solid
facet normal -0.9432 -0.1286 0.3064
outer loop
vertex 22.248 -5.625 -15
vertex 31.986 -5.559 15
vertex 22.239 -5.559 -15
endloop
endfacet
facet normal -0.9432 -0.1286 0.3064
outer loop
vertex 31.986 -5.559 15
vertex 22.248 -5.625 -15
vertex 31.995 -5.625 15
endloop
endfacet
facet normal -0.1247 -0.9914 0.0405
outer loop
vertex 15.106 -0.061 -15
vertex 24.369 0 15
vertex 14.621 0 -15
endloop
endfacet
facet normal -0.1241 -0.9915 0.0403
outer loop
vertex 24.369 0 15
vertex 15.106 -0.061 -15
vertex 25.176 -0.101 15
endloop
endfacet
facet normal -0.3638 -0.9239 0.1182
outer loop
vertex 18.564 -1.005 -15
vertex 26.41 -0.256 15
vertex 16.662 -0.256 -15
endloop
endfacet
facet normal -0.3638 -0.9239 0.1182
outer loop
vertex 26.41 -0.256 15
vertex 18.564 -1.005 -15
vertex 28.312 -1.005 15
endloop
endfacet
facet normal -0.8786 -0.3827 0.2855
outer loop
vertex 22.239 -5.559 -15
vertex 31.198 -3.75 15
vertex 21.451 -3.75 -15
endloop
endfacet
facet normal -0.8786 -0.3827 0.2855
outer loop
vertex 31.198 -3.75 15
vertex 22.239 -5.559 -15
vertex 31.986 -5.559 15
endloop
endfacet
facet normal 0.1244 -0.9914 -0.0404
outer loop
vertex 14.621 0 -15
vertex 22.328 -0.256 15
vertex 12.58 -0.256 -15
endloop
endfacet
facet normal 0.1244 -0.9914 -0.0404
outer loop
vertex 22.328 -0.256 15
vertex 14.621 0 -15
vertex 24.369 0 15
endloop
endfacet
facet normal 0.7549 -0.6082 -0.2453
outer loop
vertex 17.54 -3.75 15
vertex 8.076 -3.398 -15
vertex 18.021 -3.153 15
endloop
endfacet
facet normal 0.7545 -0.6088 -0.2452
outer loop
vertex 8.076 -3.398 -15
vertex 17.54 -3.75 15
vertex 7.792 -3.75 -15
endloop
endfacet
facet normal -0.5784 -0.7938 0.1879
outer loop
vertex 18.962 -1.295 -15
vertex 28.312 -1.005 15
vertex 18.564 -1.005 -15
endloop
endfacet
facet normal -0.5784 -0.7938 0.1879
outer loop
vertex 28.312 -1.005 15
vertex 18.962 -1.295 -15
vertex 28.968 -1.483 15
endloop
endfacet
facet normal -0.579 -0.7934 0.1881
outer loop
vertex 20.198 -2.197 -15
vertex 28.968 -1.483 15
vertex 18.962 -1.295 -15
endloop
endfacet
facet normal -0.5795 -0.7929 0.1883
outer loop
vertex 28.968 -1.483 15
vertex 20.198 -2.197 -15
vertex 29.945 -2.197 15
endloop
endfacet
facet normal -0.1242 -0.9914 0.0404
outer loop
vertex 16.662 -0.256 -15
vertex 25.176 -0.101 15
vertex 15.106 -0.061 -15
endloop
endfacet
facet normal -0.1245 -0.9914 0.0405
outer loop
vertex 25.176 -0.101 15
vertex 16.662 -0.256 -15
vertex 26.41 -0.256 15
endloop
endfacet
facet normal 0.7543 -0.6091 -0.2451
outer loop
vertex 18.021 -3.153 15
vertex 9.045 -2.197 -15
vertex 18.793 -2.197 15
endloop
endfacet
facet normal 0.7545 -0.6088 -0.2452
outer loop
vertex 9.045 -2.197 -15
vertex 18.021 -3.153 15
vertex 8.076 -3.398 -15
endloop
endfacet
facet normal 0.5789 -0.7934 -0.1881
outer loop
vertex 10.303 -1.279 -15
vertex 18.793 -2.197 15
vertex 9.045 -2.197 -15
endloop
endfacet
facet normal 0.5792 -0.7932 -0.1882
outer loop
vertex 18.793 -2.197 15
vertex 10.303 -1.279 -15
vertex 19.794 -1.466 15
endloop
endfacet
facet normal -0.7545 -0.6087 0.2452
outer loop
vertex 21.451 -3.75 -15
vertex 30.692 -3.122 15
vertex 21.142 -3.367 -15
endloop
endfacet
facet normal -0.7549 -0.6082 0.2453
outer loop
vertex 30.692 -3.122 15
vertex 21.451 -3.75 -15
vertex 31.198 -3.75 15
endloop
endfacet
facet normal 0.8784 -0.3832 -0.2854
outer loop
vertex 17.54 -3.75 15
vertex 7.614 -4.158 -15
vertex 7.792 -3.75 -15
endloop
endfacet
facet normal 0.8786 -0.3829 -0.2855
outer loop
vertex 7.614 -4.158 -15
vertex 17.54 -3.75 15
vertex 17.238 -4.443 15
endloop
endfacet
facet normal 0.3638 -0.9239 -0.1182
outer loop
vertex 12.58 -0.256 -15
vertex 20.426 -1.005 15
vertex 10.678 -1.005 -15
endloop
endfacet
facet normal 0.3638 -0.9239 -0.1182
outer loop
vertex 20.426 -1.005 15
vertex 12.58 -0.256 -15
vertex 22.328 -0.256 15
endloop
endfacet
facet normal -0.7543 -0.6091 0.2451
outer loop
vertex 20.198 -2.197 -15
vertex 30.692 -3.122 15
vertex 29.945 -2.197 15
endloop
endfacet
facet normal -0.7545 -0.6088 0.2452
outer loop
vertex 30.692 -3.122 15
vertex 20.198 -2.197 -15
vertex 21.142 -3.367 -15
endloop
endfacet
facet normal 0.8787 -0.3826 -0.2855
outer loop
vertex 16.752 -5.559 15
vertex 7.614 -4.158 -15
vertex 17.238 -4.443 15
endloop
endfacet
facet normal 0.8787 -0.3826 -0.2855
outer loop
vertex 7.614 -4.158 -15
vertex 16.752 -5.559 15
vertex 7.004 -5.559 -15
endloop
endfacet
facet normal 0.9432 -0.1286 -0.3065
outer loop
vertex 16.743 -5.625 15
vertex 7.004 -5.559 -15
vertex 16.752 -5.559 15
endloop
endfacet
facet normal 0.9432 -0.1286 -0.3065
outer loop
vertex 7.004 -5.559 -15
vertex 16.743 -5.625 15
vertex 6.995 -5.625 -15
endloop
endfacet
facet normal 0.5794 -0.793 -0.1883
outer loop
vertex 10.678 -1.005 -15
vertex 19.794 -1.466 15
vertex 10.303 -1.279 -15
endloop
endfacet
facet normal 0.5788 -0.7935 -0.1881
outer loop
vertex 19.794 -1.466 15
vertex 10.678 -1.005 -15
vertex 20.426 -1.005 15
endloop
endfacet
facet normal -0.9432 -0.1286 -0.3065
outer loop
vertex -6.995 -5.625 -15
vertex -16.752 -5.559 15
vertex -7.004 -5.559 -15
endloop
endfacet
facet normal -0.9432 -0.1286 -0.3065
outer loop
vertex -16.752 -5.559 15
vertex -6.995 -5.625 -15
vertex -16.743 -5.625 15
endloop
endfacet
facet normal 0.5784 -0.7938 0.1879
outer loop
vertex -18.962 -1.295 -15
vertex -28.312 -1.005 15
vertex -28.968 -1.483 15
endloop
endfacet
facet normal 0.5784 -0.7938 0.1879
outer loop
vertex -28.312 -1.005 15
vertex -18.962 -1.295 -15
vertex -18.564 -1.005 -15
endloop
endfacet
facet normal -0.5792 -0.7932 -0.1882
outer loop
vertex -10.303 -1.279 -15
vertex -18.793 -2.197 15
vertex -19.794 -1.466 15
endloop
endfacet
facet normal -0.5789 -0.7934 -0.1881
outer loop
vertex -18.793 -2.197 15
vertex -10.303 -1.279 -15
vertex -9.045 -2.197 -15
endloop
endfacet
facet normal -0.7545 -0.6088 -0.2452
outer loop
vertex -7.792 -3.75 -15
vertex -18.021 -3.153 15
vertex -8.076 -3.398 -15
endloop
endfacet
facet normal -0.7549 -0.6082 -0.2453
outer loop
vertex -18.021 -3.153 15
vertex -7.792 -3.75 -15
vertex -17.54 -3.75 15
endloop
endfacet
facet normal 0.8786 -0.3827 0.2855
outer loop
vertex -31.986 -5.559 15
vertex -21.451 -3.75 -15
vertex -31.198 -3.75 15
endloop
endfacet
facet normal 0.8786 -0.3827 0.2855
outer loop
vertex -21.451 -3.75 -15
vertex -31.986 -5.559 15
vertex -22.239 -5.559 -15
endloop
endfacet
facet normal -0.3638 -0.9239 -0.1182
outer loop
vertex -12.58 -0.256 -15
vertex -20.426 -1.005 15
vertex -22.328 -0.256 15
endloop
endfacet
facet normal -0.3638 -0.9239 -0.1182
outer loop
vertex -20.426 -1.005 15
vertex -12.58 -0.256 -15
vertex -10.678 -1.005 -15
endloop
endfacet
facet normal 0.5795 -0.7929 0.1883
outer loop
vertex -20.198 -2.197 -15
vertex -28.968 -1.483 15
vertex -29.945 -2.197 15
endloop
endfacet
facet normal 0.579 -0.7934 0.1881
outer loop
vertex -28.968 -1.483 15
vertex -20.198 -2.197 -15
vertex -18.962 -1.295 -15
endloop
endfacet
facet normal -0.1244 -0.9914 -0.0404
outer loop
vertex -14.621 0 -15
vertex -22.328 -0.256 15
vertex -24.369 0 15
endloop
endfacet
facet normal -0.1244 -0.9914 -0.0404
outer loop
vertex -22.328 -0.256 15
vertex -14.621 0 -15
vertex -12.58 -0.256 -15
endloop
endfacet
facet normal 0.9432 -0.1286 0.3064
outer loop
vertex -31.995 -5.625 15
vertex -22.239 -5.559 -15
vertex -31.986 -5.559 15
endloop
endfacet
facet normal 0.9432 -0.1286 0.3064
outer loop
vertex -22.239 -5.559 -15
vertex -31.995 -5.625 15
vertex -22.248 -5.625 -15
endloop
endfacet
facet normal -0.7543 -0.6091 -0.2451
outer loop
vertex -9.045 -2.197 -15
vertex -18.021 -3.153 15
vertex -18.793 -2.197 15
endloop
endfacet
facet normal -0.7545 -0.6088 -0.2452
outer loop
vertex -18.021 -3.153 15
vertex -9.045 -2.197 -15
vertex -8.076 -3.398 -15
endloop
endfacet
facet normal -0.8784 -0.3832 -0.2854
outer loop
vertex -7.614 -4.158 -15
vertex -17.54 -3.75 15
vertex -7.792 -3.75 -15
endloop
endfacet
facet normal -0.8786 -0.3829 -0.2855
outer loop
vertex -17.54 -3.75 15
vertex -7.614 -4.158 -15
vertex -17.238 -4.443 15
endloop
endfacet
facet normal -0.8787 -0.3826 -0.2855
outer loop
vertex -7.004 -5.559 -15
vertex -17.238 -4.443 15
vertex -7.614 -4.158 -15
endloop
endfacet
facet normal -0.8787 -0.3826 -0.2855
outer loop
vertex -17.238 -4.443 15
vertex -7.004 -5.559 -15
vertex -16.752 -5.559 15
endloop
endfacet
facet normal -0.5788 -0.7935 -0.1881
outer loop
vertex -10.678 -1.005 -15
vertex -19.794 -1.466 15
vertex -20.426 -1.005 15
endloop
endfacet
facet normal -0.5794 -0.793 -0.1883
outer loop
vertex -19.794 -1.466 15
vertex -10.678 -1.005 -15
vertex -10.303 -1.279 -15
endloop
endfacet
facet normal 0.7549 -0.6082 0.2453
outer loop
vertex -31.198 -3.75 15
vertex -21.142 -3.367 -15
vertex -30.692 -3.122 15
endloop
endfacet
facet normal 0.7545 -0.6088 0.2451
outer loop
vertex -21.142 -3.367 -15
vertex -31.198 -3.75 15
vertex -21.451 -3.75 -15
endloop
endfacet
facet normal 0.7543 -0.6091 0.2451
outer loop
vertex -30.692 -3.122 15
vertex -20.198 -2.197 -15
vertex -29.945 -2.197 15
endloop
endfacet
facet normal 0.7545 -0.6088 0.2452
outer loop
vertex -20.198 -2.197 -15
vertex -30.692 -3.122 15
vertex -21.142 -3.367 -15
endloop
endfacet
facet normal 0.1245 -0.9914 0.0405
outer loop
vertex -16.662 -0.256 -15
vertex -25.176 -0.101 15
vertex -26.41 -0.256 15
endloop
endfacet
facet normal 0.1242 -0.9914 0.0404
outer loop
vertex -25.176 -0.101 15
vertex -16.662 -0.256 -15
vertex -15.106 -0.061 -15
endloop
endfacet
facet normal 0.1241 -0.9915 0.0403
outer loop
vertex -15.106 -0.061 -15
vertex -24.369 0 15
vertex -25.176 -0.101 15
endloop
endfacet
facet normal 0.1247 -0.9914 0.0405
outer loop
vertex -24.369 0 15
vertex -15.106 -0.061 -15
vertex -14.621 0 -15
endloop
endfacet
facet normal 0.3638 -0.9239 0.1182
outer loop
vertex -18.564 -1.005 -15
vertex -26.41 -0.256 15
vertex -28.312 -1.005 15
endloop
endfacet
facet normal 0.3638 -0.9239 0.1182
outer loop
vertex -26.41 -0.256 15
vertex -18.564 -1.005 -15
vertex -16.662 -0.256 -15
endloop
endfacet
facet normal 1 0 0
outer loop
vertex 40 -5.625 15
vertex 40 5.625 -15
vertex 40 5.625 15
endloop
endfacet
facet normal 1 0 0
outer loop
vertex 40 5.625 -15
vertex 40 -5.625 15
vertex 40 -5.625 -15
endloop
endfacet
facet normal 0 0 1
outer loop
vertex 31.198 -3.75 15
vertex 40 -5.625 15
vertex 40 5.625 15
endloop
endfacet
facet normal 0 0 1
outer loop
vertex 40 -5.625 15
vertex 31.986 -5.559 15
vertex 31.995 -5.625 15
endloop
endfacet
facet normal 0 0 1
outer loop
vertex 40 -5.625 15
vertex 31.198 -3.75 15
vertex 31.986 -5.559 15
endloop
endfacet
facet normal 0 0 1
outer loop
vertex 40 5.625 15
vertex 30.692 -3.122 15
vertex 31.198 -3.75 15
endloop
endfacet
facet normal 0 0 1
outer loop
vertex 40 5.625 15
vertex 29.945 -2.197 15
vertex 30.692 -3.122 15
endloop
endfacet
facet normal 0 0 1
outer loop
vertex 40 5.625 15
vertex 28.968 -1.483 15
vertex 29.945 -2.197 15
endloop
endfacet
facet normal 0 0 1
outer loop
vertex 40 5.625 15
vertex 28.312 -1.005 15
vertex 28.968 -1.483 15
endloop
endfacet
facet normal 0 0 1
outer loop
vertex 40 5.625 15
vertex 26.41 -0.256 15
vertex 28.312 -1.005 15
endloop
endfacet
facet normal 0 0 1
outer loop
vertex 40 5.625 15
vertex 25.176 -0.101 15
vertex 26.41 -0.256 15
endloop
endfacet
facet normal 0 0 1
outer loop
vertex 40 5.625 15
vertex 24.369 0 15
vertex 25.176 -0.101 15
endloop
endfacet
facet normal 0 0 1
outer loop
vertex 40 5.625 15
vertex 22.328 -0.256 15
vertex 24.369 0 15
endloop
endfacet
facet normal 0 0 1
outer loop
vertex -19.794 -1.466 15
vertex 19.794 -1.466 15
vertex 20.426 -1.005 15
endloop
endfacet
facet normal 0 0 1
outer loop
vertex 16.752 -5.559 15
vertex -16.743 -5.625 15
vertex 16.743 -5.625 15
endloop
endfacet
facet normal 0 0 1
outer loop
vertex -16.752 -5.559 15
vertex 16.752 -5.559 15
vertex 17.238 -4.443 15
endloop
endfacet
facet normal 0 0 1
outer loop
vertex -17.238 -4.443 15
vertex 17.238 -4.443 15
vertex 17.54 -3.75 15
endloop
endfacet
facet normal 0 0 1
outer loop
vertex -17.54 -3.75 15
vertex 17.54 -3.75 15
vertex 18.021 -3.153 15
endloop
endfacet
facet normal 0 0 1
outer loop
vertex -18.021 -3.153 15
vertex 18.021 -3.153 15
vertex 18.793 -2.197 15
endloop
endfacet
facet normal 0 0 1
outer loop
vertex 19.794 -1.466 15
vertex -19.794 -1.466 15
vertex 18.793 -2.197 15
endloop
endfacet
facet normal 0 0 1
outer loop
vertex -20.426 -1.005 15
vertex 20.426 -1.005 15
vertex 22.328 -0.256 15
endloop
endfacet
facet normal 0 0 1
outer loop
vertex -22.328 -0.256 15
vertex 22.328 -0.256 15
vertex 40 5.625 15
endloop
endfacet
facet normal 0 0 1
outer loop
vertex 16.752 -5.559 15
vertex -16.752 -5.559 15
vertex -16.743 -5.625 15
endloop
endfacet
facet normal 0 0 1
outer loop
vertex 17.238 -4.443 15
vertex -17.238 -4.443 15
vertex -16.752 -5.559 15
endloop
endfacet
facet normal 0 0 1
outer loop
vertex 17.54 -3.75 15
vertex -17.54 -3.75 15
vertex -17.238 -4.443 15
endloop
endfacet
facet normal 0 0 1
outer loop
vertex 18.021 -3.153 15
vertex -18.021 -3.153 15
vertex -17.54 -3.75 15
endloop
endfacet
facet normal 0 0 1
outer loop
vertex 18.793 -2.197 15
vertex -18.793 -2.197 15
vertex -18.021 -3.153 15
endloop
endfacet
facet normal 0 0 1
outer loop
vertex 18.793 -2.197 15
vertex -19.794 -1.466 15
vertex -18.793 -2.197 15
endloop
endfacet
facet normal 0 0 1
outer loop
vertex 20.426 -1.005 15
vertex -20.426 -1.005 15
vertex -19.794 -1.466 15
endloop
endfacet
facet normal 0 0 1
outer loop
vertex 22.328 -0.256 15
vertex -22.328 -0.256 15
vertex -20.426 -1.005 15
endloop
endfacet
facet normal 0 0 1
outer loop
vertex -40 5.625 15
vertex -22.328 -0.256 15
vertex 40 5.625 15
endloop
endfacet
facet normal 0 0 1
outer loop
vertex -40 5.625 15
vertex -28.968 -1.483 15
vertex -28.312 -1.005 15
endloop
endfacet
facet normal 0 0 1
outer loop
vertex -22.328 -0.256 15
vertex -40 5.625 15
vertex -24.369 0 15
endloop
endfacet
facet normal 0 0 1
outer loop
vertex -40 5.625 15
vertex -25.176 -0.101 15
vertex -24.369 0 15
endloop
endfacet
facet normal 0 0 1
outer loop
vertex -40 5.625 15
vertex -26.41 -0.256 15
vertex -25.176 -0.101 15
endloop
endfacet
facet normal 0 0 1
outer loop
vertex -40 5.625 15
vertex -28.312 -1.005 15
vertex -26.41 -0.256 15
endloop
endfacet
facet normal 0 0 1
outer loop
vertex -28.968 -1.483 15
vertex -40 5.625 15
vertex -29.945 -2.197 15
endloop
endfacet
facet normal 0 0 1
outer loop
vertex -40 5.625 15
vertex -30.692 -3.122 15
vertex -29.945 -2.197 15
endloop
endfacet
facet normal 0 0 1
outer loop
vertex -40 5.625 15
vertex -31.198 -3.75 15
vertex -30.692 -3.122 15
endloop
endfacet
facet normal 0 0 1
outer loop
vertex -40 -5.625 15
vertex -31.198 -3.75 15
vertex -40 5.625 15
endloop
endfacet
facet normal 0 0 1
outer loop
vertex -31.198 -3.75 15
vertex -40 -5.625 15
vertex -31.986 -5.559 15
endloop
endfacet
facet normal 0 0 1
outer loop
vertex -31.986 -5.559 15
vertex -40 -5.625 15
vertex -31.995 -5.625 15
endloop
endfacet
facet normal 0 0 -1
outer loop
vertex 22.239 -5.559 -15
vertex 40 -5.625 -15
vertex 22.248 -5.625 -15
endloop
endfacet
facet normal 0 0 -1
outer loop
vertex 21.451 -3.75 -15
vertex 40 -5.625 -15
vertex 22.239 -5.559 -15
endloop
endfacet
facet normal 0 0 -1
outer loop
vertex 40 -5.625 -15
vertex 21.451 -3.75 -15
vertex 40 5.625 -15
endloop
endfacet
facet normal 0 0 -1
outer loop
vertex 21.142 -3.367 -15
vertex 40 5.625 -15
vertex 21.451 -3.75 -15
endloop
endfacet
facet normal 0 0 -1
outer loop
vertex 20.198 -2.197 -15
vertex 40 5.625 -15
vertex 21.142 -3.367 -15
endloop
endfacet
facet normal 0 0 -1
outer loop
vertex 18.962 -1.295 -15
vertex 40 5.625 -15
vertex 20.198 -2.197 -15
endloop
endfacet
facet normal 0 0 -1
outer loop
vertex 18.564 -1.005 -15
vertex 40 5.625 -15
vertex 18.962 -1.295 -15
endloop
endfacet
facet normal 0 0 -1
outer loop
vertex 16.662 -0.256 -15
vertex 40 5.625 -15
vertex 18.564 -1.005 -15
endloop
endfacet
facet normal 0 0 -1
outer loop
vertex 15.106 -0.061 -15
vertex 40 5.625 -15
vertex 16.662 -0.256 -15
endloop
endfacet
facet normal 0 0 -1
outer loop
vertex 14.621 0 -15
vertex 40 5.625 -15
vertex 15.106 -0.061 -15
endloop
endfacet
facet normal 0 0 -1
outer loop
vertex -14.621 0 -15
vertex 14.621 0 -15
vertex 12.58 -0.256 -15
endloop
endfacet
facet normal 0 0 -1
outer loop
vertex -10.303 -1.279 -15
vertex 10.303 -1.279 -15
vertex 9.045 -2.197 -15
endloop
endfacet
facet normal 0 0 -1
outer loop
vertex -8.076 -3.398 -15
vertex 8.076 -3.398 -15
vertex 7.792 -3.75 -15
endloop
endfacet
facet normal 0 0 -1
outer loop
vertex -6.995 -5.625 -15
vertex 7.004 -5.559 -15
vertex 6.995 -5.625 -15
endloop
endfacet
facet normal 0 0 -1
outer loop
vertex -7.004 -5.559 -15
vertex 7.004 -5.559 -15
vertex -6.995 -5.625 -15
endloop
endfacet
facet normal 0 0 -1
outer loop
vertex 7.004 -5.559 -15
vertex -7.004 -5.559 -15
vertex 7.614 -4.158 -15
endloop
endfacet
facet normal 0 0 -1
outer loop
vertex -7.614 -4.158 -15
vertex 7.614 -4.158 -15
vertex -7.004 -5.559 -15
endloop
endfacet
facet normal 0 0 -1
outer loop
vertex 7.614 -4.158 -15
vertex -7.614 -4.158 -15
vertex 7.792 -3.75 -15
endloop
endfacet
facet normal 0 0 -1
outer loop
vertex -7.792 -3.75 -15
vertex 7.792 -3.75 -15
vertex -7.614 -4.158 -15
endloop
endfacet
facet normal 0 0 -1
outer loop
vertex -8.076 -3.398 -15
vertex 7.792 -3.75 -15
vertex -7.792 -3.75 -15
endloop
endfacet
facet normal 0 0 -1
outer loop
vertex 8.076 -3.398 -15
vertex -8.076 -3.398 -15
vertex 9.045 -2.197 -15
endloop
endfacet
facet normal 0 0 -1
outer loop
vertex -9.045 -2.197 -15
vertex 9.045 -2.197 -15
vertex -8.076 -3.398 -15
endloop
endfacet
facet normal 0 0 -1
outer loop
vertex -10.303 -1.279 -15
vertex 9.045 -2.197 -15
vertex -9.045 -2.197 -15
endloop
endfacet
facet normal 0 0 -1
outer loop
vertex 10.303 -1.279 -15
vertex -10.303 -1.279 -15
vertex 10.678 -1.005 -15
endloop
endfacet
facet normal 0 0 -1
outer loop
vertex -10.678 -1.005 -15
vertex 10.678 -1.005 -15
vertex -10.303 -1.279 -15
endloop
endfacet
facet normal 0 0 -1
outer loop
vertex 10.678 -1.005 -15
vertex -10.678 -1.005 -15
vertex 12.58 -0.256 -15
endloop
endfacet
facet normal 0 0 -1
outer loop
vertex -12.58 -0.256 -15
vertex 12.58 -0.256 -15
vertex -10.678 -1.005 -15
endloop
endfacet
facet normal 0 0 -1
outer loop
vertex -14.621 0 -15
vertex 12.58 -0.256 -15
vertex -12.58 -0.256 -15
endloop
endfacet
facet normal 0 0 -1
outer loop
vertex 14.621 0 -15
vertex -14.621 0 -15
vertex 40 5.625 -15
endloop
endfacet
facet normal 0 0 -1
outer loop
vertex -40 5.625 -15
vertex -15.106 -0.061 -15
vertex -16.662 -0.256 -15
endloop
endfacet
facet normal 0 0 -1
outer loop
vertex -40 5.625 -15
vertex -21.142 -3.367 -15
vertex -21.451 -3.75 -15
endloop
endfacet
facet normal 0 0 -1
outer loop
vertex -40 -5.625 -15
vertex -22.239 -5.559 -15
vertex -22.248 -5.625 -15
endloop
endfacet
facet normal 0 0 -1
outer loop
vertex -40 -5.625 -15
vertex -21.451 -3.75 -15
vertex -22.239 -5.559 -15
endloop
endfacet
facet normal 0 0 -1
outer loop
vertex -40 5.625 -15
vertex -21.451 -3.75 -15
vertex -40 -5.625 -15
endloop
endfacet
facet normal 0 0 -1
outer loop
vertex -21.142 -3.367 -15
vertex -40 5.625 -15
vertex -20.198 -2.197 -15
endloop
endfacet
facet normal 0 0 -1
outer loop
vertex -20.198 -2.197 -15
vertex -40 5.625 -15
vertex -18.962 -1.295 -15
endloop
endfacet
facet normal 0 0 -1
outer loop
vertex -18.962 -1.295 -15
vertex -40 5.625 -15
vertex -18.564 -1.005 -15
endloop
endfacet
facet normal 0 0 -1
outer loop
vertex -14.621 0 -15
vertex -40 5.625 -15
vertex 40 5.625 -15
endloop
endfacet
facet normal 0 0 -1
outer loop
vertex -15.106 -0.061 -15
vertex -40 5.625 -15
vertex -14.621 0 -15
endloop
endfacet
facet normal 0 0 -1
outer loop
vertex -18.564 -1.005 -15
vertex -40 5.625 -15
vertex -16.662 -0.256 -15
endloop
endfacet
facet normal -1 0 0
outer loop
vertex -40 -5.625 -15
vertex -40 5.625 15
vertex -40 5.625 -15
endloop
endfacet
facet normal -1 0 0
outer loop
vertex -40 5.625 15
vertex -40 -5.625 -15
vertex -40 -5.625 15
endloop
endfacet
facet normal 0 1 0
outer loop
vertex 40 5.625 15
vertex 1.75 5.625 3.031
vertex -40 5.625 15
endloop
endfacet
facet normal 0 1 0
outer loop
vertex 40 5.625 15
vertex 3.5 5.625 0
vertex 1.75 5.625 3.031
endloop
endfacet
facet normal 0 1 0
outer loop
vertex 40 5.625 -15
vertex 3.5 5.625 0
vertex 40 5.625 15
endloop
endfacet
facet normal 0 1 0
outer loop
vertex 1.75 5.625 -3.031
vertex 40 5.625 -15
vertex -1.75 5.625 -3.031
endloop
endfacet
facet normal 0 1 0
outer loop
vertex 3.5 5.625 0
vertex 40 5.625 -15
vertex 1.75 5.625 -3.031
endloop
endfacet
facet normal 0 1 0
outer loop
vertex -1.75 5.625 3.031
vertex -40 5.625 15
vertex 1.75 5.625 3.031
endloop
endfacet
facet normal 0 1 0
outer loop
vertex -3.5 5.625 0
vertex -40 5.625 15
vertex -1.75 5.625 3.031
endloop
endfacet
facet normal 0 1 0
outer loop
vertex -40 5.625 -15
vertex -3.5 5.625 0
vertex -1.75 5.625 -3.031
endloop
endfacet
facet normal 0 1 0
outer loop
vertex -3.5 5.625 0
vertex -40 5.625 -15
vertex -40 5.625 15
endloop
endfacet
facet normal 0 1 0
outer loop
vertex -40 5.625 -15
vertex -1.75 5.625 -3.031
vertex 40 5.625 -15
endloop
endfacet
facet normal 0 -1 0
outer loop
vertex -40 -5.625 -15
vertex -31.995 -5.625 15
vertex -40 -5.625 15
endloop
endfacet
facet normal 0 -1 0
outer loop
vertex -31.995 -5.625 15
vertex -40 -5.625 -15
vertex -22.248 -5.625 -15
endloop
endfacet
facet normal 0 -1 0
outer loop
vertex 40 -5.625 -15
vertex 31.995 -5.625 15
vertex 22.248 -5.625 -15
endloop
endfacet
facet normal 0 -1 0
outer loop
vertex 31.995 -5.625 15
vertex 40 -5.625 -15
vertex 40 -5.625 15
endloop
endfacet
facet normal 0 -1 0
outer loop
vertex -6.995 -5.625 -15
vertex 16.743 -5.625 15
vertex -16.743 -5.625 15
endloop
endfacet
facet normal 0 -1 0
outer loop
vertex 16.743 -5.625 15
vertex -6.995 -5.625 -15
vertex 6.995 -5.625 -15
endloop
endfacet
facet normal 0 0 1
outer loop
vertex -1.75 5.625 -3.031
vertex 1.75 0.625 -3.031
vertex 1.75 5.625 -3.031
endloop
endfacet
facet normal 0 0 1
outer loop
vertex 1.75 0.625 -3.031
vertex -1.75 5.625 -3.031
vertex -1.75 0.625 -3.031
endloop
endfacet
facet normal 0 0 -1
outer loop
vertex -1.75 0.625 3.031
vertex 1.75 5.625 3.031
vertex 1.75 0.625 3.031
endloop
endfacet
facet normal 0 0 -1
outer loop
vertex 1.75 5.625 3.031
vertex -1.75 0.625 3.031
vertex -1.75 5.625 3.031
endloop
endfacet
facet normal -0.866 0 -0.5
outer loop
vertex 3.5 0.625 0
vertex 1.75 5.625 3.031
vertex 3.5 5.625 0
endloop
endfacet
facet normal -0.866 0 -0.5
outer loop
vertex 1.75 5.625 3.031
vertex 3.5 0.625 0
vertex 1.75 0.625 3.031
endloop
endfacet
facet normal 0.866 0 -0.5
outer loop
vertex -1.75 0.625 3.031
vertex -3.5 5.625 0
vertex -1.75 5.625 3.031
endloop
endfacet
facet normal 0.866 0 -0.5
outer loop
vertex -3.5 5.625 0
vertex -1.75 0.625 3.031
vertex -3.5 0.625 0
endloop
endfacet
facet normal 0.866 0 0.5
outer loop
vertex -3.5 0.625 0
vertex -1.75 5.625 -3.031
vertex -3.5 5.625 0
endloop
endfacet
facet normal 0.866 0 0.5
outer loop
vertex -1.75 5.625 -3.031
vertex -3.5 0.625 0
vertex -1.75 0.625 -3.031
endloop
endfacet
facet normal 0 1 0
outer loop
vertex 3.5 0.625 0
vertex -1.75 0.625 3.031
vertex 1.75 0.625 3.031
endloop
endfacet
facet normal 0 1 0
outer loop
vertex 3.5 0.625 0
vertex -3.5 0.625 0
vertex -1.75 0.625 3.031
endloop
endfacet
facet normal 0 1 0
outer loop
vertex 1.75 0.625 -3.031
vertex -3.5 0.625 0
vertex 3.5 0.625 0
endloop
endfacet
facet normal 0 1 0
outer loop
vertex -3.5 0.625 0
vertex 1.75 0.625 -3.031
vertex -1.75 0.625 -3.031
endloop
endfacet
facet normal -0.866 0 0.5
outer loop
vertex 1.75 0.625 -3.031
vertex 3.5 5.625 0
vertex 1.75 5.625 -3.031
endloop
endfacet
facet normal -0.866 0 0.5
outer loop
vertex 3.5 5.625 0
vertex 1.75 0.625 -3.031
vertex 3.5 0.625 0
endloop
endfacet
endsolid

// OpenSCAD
angle= 36;

pipe_diameter = 15;


width = 80;
height = 30;
depth = pipe_diameter*3/2;

nut_depth = 5;
nut_diameter = 7;
srew_diameter = 5;
difference(){
    cube([width,depth/2, height], center=true);


    //piples
    #translate([0,-pipe_diameter/2,-pipe_diameter*4]){
        rotate([0,angle/2, 0])
        cylinder(h=200, d = pipe_diameter);
        rotate([0,-angle/2, 0])
        cylinder(h=200, d = pipe_diameter);
    }
    
    //srew
    translate([0,depth/4,0])
    rotate([90,0,0])
    #cylinder(h=nut_depth,d=nut_diameter,   $fn = 6);
}
